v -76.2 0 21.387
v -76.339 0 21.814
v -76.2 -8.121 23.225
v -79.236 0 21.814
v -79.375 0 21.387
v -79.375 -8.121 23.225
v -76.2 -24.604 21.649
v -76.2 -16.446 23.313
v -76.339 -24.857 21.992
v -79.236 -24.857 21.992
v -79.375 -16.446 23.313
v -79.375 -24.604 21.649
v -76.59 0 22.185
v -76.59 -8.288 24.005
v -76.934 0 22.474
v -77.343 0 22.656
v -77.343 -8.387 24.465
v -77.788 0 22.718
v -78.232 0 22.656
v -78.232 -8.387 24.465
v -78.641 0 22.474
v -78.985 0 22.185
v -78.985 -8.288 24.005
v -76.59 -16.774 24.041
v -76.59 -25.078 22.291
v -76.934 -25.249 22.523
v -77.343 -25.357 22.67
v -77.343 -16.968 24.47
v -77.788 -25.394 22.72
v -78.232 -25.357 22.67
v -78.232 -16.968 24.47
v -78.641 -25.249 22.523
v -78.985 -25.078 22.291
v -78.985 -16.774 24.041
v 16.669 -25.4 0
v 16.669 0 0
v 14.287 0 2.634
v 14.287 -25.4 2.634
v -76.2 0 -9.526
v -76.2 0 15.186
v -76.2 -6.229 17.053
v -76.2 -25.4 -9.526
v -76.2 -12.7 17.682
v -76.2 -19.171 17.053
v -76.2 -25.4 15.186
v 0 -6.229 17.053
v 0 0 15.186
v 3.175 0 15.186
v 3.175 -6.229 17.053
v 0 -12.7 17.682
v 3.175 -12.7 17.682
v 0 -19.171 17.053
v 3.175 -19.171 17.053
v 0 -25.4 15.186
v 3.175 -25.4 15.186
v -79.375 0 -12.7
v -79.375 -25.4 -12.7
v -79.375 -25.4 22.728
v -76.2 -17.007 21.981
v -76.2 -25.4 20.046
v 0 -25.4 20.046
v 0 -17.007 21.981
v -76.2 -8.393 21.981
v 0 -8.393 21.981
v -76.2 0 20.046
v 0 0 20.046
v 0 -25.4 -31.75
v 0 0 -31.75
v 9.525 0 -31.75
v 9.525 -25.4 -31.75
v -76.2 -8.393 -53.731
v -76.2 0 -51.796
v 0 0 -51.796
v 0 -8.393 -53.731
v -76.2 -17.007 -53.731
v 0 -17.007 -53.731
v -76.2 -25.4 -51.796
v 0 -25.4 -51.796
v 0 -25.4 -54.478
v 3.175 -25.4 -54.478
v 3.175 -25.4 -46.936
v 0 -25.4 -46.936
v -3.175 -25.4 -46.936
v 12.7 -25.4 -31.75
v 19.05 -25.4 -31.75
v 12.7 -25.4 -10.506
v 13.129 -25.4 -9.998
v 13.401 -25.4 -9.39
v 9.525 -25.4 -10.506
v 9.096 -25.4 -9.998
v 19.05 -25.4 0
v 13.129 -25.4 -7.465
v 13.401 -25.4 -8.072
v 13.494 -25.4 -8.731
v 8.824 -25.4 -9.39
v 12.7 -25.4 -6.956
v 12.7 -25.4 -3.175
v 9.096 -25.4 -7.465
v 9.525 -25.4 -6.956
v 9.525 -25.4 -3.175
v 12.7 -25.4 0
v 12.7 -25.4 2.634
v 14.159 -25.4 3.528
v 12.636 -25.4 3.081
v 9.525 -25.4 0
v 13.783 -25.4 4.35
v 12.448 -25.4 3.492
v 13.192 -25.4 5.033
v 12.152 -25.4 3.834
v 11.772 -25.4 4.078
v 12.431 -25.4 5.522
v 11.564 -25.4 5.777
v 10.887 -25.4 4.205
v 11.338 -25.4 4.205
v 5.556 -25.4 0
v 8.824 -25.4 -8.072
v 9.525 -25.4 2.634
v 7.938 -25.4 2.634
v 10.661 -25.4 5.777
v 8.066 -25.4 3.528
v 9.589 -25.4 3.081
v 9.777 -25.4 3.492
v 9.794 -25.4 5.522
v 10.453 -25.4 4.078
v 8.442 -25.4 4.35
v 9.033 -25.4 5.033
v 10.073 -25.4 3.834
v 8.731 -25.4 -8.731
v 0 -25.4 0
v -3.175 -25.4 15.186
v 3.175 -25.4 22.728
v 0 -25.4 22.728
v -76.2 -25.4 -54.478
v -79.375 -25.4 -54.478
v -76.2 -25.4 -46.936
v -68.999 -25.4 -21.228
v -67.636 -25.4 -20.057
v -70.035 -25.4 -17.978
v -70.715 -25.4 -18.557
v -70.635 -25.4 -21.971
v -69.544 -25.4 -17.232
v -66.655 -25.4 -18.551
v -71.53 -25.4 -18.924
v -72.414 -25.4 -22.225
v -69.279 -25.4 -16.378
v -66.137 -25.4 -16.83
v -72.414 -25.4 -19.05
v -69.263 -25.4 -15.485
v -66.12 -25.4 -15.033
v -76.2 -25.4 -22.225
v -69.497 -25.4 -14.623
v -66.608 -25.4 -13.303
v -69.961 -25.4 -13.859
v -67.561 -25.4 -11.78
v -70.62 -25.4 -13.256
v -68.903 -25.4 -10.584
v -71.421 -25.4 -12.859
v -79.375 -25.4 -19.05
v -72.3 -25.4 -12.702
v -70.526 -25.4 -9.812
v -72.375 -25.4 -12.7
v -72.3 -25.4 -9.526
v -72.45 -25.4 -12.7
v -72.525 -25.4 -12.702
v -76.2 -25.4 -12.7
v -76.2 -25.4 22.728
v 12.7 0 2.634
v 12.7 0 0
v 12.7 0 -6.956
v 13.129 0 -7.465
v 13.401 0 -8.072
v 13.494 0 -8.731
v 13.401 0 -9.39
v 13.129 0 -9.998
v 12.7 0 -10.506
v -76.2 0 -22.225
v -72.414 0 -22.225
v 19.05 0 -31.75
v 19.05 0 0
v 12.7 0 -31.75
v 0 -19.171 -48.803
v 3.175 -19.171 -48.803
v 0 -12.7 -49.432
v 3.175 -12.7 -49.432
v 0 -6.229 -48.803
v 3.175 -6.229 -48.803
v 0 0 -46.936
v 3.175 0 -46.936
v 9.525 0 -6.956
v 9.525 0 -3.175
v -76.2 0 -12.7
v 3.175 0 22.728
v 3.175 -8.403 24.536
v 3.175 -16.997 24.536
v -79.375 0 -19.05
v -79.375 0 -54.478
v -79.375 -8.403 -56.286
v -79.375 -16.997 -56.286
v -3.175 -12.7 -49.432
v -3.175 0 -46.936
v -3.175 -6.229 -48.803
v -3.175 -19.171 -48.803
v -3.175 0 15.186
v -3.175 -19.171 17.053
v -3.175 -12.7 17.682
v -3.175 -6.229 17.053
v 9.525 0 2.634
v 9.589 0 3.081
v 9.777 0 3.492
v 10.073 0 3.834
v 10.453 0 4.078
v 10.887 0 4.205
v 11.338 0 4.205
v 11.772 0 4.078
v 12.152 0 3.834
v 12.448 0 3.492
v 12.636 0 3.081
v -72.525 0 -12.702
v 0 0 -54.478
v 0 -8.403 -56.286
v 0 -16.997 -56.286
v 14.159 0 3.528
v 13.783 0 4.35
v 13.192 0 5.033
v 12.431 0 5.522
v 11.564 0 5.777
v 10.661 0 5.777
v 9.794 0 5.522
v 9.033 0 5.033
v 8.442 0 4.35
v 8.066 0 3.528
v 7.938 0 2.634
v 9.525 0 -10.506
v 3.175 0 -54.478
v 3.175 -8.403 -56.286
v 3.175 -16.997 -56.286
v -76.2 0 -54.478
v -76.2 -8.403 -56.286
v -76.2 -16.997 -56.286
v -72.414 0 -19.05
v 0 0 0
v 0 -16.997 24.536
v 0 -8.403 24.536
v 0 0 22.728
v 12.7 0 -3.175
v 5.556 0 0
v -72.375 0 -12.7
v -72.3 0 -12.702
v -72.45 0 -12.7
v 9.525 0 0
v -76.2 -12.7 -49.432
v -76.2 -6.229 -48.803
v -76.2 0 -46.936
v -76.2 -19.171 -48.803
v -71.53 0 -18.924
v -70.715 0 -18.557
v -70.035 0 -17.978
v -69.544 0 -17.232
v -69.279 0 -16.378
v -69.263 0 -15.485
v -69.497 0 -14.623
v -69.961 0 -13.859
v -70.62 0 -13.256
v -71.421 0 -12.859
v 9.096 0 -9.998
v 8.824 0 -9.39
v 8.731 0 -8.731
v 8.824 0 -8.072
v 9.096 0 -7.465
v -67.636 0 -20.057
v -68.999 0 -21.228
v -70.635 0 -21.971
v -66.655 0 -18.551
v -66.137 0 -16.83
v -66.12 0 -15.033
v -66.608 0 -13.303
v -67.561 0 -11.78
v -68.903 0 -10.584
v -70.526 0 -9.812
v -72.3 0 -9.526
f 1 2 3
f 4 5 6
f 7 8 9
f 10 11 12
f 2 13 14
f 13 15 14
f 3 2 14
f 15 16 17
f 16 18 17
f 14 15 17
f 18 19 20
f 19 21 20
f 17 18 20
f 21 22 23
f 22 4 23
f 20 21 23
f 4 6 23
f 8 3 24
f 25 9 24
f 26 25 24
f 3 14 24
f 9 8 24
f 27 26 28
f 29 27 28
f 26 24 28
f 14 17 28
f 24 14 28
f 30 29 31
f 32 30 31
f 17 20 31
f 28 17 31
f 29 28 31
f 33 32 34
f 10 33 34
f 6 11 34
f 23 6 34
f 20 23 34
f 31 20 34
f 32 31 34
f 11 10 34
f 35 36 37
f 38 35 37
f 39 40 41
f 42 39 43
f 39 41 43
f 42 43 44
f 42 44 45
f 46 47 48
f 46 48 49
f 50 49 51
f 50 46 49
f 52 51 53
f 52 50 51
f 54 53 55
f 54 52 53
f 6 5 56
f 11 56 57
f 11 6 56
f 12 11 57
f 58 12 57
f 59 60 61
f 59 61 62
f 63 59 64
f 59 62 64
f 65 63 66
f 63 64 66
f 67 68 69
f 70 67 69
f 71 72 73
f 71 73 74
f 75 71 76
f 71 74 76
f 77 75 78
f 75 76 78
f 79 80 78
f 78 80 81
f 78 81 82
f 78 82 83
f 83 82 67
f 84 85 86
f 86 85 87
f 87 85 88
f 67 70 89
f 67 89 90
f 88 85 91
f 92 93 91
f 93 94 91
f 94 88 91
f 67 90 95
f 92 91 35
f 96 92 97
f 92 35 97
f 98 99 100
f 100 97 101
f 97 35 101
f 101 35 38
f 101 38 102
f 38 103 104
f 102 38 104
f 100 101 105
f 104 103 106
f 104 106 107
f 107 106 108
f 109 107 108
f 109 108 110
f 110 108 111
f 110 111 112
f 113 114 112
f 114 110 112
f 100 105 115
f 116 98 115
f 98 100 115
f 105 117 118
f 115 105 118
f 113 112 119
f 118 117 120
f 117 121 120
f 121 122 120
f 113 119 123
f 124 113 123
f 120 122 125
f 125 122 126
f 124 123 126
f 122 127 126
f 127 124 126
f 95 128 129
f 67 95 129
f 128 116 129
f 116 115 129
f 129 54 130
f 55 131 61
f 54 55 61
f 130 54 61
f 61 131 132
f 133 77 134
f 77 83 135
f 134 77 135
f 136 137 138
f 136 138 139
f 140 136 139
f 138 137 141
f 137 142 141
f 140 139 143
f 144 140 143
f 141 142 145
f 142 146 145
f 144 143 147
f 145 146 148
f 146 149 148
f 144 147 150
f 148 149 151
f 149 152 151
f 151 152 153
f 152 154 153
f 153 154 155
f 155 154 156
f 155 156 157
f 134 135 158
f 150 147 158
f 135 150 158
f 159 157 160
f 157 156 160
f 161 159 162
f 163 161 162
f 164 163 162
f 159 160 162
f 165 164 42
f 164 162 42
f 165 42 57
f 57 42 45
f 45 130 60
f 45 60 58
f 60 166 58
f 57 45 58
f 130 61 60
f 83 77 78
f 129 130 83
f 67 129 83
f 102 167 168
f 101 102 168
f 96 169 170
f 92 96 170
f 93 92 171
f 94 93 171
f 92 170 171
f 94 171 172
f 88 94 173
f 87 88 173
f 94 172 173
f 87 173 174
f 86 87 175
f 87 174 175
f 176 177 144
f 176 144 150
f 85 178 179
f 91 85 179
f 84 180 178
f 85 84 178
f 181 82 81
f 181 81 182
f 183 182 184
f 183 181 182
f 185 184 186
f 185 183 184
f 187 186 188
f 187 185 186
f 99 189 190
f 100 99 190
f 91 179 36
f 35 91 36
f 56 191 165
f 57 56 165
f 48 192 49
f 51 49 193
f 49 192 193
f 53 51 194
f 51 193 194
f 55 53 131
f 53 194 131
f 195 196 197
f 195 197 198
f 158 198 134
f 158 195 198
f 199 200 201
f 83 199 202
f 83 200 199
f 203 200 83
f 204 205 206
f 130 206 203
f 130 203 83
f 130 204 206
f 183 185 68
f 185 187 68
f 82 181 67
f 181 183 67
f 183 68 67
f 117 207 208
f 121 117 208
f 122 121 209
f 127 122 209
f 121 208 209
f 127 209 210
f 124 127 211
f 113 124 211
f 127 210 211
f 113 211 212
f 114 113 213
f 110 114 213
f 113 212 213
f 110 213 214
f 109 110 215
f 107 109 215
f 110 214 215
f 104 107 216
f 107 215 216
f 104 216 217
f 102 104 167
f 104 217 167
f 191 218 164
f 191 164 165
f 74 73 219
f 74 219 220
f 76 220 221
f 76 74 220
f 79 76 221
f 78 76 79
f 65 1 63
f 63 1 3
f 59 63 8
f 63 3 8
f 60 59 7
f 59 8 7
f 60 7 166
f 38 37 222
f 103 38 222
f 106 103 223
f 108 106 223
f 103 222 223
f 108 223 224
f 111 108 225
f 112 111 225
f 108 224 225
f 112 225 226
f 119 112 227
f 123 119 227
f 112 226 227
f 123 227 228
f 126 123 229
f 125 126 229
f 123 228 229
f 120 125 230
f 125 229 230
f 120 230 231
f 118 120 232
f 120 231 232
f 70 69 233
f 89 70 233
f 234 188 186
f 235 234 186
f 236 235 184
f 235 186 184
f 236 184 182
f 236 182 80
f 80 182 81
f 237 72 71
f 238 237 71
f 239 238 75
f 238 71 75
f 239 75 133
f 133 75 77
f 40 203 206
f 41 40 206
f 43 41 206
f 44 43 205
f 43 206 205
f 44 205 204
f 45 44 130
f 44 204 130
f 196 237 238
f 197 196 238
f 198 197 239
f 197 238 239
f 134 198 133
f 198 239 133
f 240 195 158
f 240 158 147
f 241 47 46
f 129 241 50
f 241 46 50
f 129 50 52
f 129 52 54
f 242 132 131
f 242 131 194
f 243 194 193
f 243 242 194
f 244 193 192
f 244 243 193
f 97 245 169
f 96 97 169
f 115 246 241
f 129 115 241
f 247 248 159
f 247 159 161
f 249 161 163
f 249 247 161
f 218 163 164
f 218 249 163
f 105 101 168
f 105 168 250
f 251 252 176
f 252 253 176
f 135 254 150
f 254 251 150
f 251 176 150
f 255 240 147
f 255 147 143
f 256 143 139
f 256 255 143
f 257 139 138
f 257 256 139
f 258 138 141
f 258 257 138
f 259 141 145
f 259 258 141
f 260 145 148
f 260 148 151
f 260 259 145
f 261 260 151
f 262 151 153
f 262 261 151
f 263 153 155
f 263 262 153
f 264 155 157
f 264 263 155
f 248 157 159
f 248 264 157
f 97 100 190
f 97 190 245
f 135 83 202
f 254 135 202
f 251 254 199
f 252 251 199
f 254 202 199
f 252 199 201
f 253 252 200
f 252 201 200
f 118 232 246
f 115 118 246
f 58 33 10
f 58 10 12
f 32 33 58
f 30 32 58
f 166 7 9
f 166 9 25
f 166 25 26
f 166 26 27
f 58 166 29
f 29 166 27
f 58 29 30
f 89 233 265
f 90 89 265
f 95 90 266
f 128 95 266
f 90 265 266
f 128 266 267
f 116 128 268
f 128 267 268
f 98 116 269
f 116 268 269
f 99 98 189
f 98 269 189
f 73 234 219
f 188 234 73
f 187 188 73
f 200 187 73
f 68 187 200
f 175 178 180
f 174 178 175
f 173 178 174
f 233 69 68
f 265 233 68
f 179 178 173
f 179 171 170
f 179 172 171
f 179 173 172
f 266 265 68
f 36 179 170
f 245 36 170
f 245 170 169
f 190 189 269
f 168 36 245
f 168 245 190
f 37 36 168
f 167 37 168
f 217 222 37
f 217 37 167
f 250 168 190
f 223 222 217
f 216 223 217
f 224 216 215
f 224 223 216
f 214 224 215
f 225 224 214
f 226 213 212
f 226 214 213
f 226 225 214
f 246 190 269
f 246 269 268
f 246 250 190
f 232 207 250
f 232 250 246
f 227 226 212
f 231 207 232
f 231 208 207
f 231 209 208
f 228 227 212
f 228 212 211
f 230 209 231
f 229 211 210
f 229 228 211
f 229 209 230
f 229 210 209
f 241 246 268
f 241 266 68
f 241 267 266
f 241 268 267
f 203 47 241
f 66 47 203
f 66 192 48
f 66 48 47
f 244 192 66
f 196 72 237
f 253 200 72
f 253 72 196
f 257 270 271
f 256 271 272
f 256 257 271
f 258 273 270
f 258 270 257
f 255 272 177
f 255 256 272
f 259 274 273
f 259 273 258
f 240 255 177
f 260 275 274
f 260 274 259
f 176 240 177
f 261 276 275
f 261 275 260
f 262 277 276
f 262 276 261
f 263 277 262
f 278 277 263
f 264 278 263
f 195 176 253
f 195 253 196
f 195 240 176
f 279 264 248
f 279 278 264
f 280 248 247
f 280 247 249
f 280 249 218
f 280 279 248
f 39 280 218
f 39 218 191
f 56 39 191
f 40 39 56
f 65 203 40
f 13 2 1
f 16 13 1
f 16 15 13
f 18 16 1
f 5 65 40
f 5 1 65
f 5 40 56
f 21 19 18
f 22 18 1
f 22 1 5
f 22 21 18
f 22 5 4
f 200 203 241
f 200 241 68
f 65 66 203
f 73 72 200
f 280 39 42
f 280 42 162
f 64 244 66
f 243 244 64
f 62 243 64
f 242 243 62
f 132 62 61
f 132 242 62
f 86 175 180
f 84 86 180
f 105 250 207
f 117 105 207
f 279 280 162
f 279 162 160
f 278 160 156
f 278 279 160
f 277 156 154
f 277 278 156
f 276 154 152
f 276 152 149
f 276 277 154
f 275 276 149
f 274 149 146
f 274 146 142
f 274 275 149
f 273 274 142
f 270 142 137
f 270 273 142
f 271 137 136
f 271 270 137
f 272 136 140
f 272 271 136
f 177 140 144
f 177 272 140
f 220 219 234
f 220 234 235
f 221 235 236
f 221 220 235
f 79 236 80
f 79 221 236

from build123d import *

# Parameters (mm, degrees)
F1_DEPTH = 25.4
F2_W     = 25.4
F2_H     = 12.7
F3_DEPTH = 3.175
F4_DEPTH = 76.2
F5_START = 76.2
F5_DEPTH = 3.175
F6_DEPTH = 3.175
F8_DEPTH = 25.4


# Not quite as in the source:
# - a feature names something its author has since deleted; it is built from what else it names


with BuildPart() as f1:
    # F0 (on Front) → F1 (new body)
    with BuildSketch(Plane.XZ):
        with BuildLine():
            Line((5.55625, 0), (0, 0))
            Line((0, 0), (0, -31.75))
            Line((0, -31.75), (9.525, -31.75))
            Line((9.525, -31.75), (9.525, -10.5061289571))
            ThreePointArc((9.525, -10.5061289571), (8.73125, -8.73125), (9.525, -6.9563710429))
            Line((9.525, -6.9563710429), (9.525, -3.175))
            Line((9.525, -3.175), (11.1125, -3.175))
            Line((11.1125, -3.175), (12.7, -3.175))
            Line((12.7, -3.175), (12.7, -6.35))
            Line((12.7, -6.35), (12.7, -6.9563710429))
            ThreePointArc((12.7, -6.9563710429), (13.49375, -8.73125), (12.7, -10.5061289571))
            Line((12.7, -10.5061289571), (12.7, -28.575))
            Line((12.7, -28.575), (12.7, -31.75))
            Line((12.7, -31.75), (19.05, -31.75))
            Line((19.05, -31.75), (19.05, 0))
            Line((19.05, 0), (16.66875, 0))
            Line((16.66875, 0), (14.2875, 2.6339585893))
            ThreePointArc((14.2875, 2.6339585893), (11.1125, 5.8089585893), (7.9375, 2.6339585893))
            Line((7.9375, 2.6339585893), (5.55625, 0))
        make_face()
        with BuildLine():
            Line((12.7, 0), (11.1125, 0))
            Line((11.1125, 0), (9.525, 0))
            Line((9.525, 0), (9.525, 2.6339585893))
            ThreePointArc((9.525, 2.6339585893), (11.1125, 4.2214585893), (12.7, 2.6339585893))
            Line((12.7, 2.6339585893), (12.7, 0))
        make_face(mode=Mode.SUBTRACT)
    extrude(amount=F1_DEPTH)

    # F2 (on face) → F3 (join)
    with BuildSketch(Plane(origin=(0, 0, 0), x_dir=(0, -1, 0), z_dir=(-1, 0, 0))):
        with BuildLine():
            ThreePointArc((0, 15.186421298), (12.7, 17.6824416941), (25.4, 15.186421298))
            Line((25.4, 15.186421298), (25.4, 20.0460244843))
            ThreePointArc((25.4, 20.0460244843), (12.7, 22.225), (0, 20.0460244843))
            Line((0, 20.0460244843), (0, 15.186421298))
        make_face()
        with BuildLine():
            Line((0, 0), (25.4, 0))
            Line((25.4, 0), (25.4, 15.186421298))
            ThreePointArc((25.4, 15.186421298), (12.7, 17.6824416941), (0, 15.186421298))
            Line((0, 15.186421298), (0, 0))
        make_face()
        with BuildLine():
            Line((0, -31.75), (0, -46.936421298))
            ThreePointArc((0, -46.936421298), (12.7, -49.4324416941), (25.4, -46.936421298))
            Line((25.4, -46.936421298), (25.4, -31.75))
            Line((25.4, -31.75), (0, -31.75))
        make_face()
        with BuildLine():
            Line((0, -46.936421298), (0, -51.7960244843))
            ThreePointArc((0, -51.7960244843), (12.7, -53.975), (25.4, -51.7960244843))
            Line((25.4, -51.7960244843), (25.4, -46.936421298))
            ThreePointArc((25.4, -46.936421298), (12.7, -49.4324416941), (0, -46.936421298))
        make_face()
        with Locations((12.7, -25.4)):
            Rectangle(F2_W, F2_H)
        with Locations((12.7, -6.35)):
            Rectangle(F2_W, F2_H)
        Polygon((0, -15.875), (0, -19.05), (25.4, -19.05), (25.4, -12.7), (0, -12.7), align=None)
    extrude(amount=F3_DEPTH)

    # F2 (on face) → F4 (join)
    with BuildSketch(Plane(origin=(0, 0, 0), x_dir=(0, -1, 0), z_dir=(-1, 0, 0))):
        with BuildLine():
            ThreePointArc((0, 15.186421298), (12.7, 17.6824416941), (25.4, 15.186421298))
            Line((25.4, 15.186421298), (25.4, 20.0460244843))
            ThreePointArc((25.4, 20.0460244843), (12.7, 22.225), (0, 20.0460244843))
            Line((0, 20.0460244843), (0, 15.186421298))
        make_face()
        with BuildLine():
            Line((0, -46.936421298), (0, -51.7960244843))
            ThreePointArc((0, -51.7960244843), (12.7, -53.975), (25.4, -51.7960244843))
            Line((25.4, -51.7960244843), (25.4, -46.936421298))
            ThreePointArc((25.4, -46.936421298), (12.7, -49.4324416941), (0, -46.936421298))
        make_face()
    extrude(amount=F4_DEPTH)

    # F2 (on face) → F5 (join)
    with BuildSketch(Plane(origin=(0, 0, 0), x_dir=(0, -1, 0), z_dir=(-1, 0, 0)).offset(F5_START)):
        with BuildLine():
            ThreePointArc((25.4, -51.7960244843), (12.7, -53.975), (0, -51.7960244843))
            Line((0, -51.7960244843), (0, -54.4783297054))
            ThreePointArc((0, -54.4783297054), (12.7, -56.5137384689), (25.4, -54.4783297054))
            Line((25.4, -54.4783297054), (25.4, -51.7960244843))
        make_face()
        with BuildLine():
            Line((0, -46.936421298), (0, -51.7960244843))
            ThreePointArc((0, -51.7960244843), (12.7, -53.975), (25.4, -51.7960244843))
            Line((25.4, -51.7960244843), (25.4, -46.936421298))
            ThreePointArc((25.4, -46.936421298), (12.7, -49.4324416941), (0, -46.936421298))
        make_face()
        with BuildLine():
            Line((0, -31.75), (0, -46.936421298))
            ThreePointArc((0, -46.936421298), (12.7, -49.4324416941), (25.4, -46.936421298))
            Line((25.4, -46.936421298), (25.4, -31.75))
            Line((25.4, -31.75), (0, -31.75))
        make_face()
        with Locations((12.7, -25.4)):
            Rectangle(F2_W, F2_H)
        with Locations((12.7, -6.35)):
            Rectangle(F2_W, F2_H)
        with BuildLine():
            Line((0, 0), (25.4, 0))
            Line((25.4, 0), (25.4, 15.186421298))
            ThreePointArc((25.4, 15.186421298), (12.7, 17.6824416941), (0, 15.186421298))
            Line((0, 15.186421298), (0, 0))
        make_face()
        with BuildLine():
            ThreePointArc((0, 15.186421298), (12.7, 17.6824416941), (25.4, 15.186421298))
            Line((25.4, 15.186421298), (25.4, 20.0460244843))
            ThreePointArc((25.4, 20.0460244843), (12.7, 22.225), (0, 20.0460244843))
            Line((0, 20.0460244843), (0, 15.186421298))
        make_face()
        with BuildLine():
            ThreePointArc((0, 20.0460244843), (12.7, 22.225), (25.4, 20.0460244843))
            Line((25.4, 20.0460244843), (25.4, 22.7283297054))
            ThreePointArc((25.4, 22.7283297054), (12.7, 24.7637384689), (0, 22.7283297054))
            Line((0, 22.7283297054), (0, 20.0460244843))
        make_face()
    extrude(amount=F5_DEPTH)

    # F2 (on face) → F6 (join)
    with BuildSketch(Plane(origin=(0, 0, 0), x_dir=(0, -1, 0), z_dir=(-1, 0, 0))):
        with BuildLine():
            ThreePointArc((0, 20.0460244843), (12.7, 22.225), (25.4, 20.0460244843))
            Line((25.4, 20.0460244843), (25.4, 22.7283297054))
            ThreePointArc((25.4, 22.7283297054), (12.7, 24.7637384689), (0, 22.7283297054))
            Line((0, 22.7283297054), (0, 20.0460244843))
        make_face()
        with BuildLine():
            ThreePointArc((0, 15.186421298), (12.7, 17.6824416941), (25.4, 15.186421298))
            Line((25.4, 15.186421298), (25.4, 20.0460244843))
            ThreePointArc((25.4, 20.0460244843), (12.7, 22.225), (0, 20.0460244843))
            Line((0, 20.0460244843), (0, 15.186421298))
        make_face()
        with BuildLine():
            Line((0, -46.936421298), (0, -51.7960244843))
            ThreePointArc((0, -51.7960244843), (12.7, -53.975), (25.4, -51.7960244843))
            Line((25.4, -51.7960244843), (25.4, -46.936421298))
            ThreePointArc((25.4, -46.936421298), (12.7, -49.4324416941), (0, -46.936421298))
        make_face()
        with BuildLine():
            ThreePointArc((25.4, -51.7960244843), (12.7, -53.975), (0, -51.7960244843))
            Line((0, -51.7960244843), (0, -54.4783297054))
            ThreePointArc((0, -54.4783297054), (12.7, -56.5137384689), (25.4, -54.4783297054))
            Line((25.4, -54.4783297054), (25.4, -51.7960244843))
        make_face()
    extrude(amount=-F6_DEPTH)

    # F7 (on face) → F8 (join)
    with BuildSketch(Plane(origin=(0, 0, 0), x_dir=(-1, 0, 0), z_dir=(0, 1, 0))):
        with BuildLine():
            ThreePointArc((72.300083342, -12.7020545776), (72.4126137623, -12.7000004406), (72.5251462844, -12.7019360086))
            Line((72.5251462844, -12.7019360086), (76.2, -12.7))
            Line((76.2, -12.7), (76.2, -9.5260270395))
            Line((76.2, -9.5260270395), (72.5284895273, -9.5260270395))
            Line((72.5284895273, -9.5260270395), (72.300083342, -9.5260270395))
            ThreePointArc((72.300083342, -9.5260270395), (66.0645431997, -15.9321038554), (72.4142864347, -22.225))
            Line((72.4142864347, -22.225), (76.2, -22.225))
            Line((76.2, -22.225), (76.2, -19.05))
            Line((76.2, -19.05), (72.4142864347, -19.05))
            ThreePointArc((72.4142864347, -19.05), (69.2398001206, -15.9321107863), (72.300083342, -12.7020545776))
        make_face()
    extrude(amount=-F8_DEPTH)

    # F9: sweep along a path in F9_path
    with BuildLine(Plane(origin=(-79.375, 0, 22.7283297054), x_dir=(0, 0, -1), z_dir=(-1, 0, 0))) as f9_path:
        ThreePointArc((0, 0), (-2.0354087635, 12.7), (0, 25.4))
    # F7 (on face) → F9 (sweep, cut)
    with BuildSketch(Plane(origin=(0, 0, 0), x_dir=(-1, 0, 0), z_dir=(0, 1, 0))):
        with BuildLine():
            ThreePointArc((76.2, 21.3871770949), (77.7875, 22.7182272858), (79.375, 21.3871770949))
            Line((79.375, 21.3871770949), (79.375, 22.7283297054))
            Line((79.375, 22.7283297054), (77.7875, 22.7283297054))
            Line((77.7875, 22.7283297054), (76.2, 22.7283297054))
            Line((76.2, 22.7283297054), (76.2, 21.3871770949))
        make_face()
    sweep(path=f9_path.line, mode=Mode.SUBTRACT)


solid = f1.part
